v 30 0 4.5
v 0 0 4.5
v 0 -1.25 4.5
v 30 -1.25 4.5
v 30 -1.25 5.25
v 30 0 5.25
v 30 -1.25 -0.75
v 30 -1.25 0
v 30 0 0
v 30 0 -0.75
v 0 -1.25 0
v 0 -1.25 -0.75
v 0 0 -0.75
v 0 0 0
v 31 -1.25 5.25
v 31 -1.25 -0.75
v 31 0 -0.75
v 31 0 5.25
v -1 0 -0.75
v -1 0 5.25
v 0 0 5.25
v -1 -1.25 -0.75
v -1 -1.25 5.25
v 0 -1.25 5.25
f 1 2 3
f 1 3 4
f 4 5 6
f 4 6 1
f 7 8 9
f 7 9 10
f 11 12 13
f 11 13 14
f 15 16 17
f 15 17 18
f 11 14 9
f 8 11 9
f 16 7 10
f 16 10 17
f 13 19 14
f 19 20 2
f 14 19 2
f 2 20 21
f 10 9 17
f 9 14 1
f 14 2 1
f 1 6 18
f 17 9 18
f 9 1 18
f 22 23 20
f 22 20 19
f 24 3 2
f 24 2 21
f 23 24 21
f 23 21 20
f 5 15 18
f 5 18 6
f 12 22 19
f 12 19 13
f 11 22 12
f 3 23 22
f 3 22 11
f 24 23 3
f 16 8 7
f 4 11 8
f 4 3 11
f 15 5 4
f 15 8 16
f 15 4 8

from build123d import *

# Parameters (mm, degrees)
F0_W     = 30
F0_H     = 4.5
F1_DEPTH = 1.25
F3_DEPTH = 1.25


with BuildPart() as f1:
    # F0 (on Front) → F1 (new body)
    with BuildSketch(Plane.XZ):
        with Locations((15, 2.25)):
            Rectangle(F0_W, F0_H)
    extrude(amount=F1_DEPTH)

    # F2 (on face) → F3 (join)
    with BuildSketch(Plane.XZ.offset(1.25)):
        Polygon((0, 0), (0, 4.5), (0, 5.25), (-1, 5.25), (-1, -0.75), (0, -0.75), align=None)
        Polygon((30, 5.25), (30, 4.5), (30, 0), (30, -0.75), (31, -0.75), (31, 5.25), align=None)
    extrude(amount=-F3_DEPTH)


solid = f1.part
